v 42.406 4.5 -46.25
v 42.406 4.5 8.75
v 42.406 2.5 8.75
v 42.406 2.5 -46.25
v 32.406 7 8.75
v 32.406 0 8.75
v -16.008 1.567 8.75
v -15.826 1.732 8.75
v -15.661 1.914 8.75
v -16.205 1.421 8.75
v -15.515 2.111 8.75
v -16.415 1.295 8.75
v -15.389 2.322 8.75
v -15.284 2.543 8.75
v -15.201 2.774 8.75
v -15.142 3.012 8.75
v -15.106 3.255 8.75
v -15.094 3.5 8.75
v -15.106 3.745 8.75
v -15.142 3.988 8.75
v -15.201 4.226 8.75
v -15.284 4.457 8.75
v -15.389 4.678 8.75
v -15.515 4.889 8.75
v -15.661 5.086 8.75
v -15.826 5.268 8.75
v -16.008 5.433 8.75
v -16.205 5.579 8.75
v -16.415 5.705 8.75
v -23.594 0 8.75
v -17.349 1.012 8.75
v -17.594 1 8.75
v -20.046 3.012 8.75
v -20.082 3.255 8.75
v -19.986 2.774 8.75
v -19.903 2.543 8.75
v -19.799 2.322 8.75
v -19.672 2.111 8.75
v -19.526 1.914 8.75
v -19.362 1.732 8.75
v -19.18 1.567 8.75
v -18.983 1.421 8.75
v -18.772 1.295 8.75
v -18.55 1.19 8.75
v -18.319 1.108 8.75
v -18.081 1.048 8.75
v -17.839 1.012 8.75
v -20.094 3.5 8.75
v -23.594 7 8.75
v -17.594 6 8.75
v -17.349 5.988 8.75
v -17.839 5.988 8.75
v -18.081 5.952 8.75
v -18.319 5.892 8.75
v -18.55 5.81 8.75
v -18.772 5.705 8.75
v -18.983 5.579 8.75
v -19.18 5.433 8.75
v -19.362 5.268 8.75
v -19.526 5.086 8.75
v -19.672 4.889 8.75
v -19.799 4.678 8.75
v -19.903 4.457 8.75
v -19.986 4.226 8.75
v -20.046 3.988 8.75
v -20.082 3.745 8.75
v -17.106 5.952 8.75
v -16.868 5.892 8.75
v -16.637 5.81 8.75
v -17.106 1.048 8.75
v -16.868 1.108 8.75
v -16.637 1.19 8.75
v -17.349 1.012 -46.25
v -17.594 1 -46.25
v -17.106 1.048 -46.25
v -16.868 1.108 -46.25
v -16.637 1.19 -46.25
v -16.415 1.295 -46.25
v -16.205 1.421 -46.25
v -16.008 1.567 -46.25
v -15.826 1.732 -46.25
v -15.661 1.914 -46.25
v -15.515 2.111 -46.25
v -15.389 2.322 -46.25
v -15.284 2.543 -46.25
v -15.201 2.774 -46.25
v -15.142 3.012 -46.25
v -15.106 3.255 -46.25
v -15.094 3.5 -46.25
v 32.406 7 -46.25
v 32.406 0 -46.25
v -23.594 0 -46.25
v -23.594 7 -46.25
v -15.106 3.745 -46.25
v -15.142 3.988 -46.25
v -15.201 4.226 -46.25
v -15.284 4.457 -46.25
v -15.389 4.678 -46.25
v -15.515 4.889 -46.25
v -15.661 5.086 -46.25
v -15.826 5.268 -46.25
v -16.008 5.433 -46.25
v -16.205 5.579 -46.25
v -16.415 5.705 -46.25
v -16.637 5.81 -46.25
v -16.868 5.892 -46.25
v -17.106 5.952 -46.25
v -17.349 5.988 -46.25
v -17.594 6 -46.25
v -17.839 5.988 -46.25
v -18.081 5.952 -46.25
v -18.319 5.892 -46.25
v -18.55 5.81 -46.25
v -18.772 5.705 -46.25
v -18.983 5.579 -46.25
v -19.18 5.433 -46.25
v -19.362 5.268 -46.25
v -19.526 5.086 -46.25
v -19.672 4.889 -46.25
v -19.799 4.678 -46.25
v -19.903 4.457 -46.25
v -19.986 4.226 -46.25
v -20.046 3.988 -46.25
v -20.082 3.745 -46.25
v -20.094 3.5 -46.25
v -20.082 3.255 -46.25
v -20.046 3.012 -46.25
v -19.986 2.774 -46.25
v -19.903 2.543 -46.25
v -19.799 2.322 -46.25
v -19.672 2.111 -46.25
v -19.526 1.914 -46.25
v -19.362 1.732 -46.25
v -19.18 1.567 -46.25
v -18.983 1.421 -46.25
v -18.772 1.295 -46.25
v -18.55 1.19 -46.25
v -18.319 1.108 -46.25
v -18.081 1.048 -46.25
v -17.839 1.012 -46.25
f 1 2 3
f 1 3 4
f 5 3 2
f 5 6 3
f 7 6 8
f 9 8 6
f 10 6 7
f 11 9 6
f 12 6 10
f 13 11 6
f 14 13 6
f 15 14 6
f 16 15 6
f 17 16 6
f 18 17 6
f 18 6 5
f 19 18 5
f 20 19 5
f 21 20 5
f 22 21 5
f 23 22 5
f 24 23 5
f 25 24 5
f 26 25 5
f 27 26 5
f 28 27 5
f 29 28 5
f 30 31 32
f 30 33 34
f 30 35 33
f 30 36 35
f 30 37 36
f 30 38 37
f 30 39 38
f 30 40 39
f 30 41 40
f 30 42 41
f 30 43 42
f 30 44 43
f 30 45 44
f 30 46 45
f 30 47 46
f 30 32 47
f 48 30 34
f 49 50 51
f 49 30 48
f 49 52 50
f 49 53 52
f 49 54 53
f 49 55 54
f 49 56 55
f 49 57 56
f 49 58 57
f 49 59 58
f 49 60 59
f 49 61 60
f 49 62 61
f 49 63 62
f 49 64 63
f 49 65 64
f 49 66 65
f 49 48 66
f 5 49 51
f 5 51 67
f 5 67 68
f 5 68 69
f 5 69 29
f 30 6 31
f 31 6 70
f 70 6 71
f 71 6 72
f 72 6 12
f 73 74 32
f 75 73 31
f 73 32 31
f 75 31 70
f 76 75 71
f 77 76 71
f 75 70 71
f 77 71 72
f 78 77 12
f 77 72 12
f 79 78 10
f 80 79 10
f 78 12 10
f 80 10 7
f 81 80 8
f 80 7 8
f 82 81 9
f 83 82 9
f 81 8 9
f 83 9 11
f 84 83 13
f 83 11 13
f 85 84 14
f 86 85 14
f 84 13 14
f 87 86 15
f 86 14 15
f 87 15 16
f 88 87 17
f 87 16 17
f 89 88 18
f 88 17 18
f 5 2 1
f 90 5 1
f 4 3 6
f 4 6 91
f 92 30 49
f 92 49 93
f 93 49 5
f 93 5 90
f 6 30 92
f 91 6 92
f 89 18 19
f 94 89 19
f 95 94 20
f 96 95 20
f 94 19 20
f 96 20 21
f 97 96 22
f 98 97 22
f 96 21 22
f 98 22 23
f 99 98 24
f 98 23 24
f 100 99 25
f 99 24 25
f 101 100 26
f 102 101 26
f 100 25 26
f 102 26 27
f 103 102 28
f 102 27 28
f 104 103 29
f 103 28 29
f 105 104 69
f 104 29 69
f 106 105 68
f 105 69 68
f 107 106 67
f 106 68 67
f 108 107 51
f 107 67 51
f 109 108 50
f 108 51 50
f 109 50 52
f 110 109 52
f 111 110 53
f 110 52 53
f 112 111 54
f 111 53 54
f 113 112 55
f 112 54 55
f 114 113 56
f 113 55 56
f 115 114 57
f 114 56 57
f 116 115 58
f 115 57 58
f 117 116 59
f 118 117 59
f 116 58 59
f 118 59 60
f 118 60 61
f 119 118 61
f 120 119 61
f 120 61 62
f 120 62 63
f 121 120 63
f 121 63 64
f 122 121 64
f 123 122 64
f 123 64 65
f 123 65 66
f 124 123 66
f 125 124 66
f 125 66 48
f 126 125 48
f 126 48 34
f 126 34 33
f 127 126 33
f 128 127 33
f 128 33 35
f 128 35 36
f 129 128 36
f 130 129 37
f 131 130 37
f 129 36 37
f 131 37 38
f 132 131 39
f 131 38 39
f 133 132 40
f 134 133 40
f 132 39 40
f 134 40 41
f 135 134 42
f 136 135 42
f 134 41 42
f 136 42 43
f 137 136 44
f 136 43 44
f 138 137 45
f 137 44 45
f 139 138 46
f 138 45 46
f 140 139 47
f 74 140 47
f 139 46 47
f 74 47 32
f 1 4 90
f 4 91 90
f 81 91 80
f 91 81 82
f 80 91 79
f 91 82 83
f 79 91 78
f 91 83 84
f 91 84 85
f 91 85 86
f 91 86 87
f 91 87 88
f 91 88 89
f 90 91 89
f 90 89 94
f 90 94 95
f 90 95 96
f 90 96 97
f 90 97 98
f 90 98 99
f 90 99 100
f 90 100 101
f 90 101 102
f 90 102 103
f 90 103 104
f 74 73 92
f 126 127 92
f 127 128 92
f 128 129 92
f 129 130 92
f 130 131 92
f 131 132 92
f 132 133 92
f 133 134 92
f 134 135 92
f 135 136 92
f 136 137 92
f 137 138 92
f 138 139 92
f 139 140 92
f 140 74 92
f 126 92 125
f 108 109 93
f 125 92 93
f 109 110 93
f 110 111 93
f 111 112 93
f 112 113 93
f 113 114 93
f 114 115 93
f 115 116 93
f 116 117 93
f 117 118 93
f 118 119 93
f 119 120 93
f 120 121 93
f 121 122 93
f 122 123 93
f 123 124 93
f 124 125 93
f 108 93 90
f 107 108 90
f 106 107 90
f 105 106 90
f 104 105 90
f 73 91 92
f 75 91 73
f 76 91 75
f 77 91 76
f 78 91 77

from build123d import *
from OCP.BRepFilletAPI import BRepFilletAPI_MakeChamfer

# Parameters (mm, degrees)
SKETCH1_W           = 44
SKETCH1_H           = 55
BOSS_EXTRUDE1_DEPTH = 7
CUT_EXTRUDE1_DEPTH  = 100
SKETCH3_W           = 55
SKETCH3_H           = 7
BOSS_EXTRUDE2_DEPTH = 22
CHAMFER1_SIZE       = 10
CHAMFER1_SIZE2      = 2.5


with BuildPart() as part:
    # Sketch1 → Boss-Extrude1 (new body)
    with BuildSketch(Plane(origin=(0, 0, 0), x_dir=(1, 0, 0), z_dir=(0, 1, 0))):
        with Locations((-1.59375, 18.75)):
            Rectangle(SKETCH1_W, SKETCH1_H)
    extrude(amount=BOSS_EXTRUDE1_DEPTH)

    # Sketch2 → Cut-Extrude1 (cut)
    with BuildSketch(Plane.XY.offset(8.75)):
        with BuildLine():
            ThreePointArc((-15.09375, 3.5), (-15.825983047, 5.267766953), (-17.59375, 6))
            Line((-17.59375, 6), (-17.59375, 1))
            ThreePointArc((-17.59375, 1), (-15.825983047, 1.732233047), (-15.09375, 3.5))
        make_face()
        with BuildLine():
            Line((-17.59375, 1), (-17.59375, 6))
            ThreePointArc((-17.59375, 6), (-20.09375, 3.5), (-17.59375, 1))
        make_face()
    extrude(amount=-CUT_EXTRUDE1_DEPTH, mode=Mode.SUBTRACT)

    # Sketch3 → Boss-Extrude2 (add)
    with BuildSketch(Plane(origin=(20.40625, 0, 0), x_dir=(0, 0, -1), z_dir=(1, 0, 0))):
        with Locations((18.75, 3.5)):
            Rectangle(SKETCH3_W, SKETCH3_H)
    extrude(amount=BOSS_EXTRUDE2_DEPTH)

    # Chamfer1: one chamfer whose edges measure the first distance from different faces: ONE call of the kernel's chamfer builder (chamfer() names one face for all edges)
    chamfer1_edges_1 = [part.edges().sort_by_distance(p)[0] for p in [
        (42.40625, 0, -18.75),
    ]]
    chamfer1_side_1 = [part.faces().sort_by_distance(p)[0] for p in [
        (9.40625, 0, -18.75),
    ]]
    chamfer1_edges_2 = [part.edges().sort_by_distance(p)[0] for p in [
        (42.40625, 7, -18.75),
    ]]
    chamfer1_side_2 = [part.faces().sort_by_distance(p)[0] for p in [
        (9.40625, 7, -18.75),
    ]]
    chamfer1 = BRepFilletAPI_MakeChamfer(part.part.solid().wrapped)
    for e in chamfer1_edges_1:
        chamfer1.Add(CHAMFER1_SIZE, CHAMFER1_SIZE2, e.wrapped, chamfer1_side_1[0].wrapped)  # the first distance lies on this face
    for e in chamfer1_edges_2:
        chamfer1.Add(CHAMFER1_SIZE, CHAMFER1_SIZE2, e.wrapped, chamfer1_side_2[0].wrapped)  # the first distance lies on this face
    add(Compound.cast(chamfer1.Shape()), mode=Mode.REPLACE)


solid = part.part
